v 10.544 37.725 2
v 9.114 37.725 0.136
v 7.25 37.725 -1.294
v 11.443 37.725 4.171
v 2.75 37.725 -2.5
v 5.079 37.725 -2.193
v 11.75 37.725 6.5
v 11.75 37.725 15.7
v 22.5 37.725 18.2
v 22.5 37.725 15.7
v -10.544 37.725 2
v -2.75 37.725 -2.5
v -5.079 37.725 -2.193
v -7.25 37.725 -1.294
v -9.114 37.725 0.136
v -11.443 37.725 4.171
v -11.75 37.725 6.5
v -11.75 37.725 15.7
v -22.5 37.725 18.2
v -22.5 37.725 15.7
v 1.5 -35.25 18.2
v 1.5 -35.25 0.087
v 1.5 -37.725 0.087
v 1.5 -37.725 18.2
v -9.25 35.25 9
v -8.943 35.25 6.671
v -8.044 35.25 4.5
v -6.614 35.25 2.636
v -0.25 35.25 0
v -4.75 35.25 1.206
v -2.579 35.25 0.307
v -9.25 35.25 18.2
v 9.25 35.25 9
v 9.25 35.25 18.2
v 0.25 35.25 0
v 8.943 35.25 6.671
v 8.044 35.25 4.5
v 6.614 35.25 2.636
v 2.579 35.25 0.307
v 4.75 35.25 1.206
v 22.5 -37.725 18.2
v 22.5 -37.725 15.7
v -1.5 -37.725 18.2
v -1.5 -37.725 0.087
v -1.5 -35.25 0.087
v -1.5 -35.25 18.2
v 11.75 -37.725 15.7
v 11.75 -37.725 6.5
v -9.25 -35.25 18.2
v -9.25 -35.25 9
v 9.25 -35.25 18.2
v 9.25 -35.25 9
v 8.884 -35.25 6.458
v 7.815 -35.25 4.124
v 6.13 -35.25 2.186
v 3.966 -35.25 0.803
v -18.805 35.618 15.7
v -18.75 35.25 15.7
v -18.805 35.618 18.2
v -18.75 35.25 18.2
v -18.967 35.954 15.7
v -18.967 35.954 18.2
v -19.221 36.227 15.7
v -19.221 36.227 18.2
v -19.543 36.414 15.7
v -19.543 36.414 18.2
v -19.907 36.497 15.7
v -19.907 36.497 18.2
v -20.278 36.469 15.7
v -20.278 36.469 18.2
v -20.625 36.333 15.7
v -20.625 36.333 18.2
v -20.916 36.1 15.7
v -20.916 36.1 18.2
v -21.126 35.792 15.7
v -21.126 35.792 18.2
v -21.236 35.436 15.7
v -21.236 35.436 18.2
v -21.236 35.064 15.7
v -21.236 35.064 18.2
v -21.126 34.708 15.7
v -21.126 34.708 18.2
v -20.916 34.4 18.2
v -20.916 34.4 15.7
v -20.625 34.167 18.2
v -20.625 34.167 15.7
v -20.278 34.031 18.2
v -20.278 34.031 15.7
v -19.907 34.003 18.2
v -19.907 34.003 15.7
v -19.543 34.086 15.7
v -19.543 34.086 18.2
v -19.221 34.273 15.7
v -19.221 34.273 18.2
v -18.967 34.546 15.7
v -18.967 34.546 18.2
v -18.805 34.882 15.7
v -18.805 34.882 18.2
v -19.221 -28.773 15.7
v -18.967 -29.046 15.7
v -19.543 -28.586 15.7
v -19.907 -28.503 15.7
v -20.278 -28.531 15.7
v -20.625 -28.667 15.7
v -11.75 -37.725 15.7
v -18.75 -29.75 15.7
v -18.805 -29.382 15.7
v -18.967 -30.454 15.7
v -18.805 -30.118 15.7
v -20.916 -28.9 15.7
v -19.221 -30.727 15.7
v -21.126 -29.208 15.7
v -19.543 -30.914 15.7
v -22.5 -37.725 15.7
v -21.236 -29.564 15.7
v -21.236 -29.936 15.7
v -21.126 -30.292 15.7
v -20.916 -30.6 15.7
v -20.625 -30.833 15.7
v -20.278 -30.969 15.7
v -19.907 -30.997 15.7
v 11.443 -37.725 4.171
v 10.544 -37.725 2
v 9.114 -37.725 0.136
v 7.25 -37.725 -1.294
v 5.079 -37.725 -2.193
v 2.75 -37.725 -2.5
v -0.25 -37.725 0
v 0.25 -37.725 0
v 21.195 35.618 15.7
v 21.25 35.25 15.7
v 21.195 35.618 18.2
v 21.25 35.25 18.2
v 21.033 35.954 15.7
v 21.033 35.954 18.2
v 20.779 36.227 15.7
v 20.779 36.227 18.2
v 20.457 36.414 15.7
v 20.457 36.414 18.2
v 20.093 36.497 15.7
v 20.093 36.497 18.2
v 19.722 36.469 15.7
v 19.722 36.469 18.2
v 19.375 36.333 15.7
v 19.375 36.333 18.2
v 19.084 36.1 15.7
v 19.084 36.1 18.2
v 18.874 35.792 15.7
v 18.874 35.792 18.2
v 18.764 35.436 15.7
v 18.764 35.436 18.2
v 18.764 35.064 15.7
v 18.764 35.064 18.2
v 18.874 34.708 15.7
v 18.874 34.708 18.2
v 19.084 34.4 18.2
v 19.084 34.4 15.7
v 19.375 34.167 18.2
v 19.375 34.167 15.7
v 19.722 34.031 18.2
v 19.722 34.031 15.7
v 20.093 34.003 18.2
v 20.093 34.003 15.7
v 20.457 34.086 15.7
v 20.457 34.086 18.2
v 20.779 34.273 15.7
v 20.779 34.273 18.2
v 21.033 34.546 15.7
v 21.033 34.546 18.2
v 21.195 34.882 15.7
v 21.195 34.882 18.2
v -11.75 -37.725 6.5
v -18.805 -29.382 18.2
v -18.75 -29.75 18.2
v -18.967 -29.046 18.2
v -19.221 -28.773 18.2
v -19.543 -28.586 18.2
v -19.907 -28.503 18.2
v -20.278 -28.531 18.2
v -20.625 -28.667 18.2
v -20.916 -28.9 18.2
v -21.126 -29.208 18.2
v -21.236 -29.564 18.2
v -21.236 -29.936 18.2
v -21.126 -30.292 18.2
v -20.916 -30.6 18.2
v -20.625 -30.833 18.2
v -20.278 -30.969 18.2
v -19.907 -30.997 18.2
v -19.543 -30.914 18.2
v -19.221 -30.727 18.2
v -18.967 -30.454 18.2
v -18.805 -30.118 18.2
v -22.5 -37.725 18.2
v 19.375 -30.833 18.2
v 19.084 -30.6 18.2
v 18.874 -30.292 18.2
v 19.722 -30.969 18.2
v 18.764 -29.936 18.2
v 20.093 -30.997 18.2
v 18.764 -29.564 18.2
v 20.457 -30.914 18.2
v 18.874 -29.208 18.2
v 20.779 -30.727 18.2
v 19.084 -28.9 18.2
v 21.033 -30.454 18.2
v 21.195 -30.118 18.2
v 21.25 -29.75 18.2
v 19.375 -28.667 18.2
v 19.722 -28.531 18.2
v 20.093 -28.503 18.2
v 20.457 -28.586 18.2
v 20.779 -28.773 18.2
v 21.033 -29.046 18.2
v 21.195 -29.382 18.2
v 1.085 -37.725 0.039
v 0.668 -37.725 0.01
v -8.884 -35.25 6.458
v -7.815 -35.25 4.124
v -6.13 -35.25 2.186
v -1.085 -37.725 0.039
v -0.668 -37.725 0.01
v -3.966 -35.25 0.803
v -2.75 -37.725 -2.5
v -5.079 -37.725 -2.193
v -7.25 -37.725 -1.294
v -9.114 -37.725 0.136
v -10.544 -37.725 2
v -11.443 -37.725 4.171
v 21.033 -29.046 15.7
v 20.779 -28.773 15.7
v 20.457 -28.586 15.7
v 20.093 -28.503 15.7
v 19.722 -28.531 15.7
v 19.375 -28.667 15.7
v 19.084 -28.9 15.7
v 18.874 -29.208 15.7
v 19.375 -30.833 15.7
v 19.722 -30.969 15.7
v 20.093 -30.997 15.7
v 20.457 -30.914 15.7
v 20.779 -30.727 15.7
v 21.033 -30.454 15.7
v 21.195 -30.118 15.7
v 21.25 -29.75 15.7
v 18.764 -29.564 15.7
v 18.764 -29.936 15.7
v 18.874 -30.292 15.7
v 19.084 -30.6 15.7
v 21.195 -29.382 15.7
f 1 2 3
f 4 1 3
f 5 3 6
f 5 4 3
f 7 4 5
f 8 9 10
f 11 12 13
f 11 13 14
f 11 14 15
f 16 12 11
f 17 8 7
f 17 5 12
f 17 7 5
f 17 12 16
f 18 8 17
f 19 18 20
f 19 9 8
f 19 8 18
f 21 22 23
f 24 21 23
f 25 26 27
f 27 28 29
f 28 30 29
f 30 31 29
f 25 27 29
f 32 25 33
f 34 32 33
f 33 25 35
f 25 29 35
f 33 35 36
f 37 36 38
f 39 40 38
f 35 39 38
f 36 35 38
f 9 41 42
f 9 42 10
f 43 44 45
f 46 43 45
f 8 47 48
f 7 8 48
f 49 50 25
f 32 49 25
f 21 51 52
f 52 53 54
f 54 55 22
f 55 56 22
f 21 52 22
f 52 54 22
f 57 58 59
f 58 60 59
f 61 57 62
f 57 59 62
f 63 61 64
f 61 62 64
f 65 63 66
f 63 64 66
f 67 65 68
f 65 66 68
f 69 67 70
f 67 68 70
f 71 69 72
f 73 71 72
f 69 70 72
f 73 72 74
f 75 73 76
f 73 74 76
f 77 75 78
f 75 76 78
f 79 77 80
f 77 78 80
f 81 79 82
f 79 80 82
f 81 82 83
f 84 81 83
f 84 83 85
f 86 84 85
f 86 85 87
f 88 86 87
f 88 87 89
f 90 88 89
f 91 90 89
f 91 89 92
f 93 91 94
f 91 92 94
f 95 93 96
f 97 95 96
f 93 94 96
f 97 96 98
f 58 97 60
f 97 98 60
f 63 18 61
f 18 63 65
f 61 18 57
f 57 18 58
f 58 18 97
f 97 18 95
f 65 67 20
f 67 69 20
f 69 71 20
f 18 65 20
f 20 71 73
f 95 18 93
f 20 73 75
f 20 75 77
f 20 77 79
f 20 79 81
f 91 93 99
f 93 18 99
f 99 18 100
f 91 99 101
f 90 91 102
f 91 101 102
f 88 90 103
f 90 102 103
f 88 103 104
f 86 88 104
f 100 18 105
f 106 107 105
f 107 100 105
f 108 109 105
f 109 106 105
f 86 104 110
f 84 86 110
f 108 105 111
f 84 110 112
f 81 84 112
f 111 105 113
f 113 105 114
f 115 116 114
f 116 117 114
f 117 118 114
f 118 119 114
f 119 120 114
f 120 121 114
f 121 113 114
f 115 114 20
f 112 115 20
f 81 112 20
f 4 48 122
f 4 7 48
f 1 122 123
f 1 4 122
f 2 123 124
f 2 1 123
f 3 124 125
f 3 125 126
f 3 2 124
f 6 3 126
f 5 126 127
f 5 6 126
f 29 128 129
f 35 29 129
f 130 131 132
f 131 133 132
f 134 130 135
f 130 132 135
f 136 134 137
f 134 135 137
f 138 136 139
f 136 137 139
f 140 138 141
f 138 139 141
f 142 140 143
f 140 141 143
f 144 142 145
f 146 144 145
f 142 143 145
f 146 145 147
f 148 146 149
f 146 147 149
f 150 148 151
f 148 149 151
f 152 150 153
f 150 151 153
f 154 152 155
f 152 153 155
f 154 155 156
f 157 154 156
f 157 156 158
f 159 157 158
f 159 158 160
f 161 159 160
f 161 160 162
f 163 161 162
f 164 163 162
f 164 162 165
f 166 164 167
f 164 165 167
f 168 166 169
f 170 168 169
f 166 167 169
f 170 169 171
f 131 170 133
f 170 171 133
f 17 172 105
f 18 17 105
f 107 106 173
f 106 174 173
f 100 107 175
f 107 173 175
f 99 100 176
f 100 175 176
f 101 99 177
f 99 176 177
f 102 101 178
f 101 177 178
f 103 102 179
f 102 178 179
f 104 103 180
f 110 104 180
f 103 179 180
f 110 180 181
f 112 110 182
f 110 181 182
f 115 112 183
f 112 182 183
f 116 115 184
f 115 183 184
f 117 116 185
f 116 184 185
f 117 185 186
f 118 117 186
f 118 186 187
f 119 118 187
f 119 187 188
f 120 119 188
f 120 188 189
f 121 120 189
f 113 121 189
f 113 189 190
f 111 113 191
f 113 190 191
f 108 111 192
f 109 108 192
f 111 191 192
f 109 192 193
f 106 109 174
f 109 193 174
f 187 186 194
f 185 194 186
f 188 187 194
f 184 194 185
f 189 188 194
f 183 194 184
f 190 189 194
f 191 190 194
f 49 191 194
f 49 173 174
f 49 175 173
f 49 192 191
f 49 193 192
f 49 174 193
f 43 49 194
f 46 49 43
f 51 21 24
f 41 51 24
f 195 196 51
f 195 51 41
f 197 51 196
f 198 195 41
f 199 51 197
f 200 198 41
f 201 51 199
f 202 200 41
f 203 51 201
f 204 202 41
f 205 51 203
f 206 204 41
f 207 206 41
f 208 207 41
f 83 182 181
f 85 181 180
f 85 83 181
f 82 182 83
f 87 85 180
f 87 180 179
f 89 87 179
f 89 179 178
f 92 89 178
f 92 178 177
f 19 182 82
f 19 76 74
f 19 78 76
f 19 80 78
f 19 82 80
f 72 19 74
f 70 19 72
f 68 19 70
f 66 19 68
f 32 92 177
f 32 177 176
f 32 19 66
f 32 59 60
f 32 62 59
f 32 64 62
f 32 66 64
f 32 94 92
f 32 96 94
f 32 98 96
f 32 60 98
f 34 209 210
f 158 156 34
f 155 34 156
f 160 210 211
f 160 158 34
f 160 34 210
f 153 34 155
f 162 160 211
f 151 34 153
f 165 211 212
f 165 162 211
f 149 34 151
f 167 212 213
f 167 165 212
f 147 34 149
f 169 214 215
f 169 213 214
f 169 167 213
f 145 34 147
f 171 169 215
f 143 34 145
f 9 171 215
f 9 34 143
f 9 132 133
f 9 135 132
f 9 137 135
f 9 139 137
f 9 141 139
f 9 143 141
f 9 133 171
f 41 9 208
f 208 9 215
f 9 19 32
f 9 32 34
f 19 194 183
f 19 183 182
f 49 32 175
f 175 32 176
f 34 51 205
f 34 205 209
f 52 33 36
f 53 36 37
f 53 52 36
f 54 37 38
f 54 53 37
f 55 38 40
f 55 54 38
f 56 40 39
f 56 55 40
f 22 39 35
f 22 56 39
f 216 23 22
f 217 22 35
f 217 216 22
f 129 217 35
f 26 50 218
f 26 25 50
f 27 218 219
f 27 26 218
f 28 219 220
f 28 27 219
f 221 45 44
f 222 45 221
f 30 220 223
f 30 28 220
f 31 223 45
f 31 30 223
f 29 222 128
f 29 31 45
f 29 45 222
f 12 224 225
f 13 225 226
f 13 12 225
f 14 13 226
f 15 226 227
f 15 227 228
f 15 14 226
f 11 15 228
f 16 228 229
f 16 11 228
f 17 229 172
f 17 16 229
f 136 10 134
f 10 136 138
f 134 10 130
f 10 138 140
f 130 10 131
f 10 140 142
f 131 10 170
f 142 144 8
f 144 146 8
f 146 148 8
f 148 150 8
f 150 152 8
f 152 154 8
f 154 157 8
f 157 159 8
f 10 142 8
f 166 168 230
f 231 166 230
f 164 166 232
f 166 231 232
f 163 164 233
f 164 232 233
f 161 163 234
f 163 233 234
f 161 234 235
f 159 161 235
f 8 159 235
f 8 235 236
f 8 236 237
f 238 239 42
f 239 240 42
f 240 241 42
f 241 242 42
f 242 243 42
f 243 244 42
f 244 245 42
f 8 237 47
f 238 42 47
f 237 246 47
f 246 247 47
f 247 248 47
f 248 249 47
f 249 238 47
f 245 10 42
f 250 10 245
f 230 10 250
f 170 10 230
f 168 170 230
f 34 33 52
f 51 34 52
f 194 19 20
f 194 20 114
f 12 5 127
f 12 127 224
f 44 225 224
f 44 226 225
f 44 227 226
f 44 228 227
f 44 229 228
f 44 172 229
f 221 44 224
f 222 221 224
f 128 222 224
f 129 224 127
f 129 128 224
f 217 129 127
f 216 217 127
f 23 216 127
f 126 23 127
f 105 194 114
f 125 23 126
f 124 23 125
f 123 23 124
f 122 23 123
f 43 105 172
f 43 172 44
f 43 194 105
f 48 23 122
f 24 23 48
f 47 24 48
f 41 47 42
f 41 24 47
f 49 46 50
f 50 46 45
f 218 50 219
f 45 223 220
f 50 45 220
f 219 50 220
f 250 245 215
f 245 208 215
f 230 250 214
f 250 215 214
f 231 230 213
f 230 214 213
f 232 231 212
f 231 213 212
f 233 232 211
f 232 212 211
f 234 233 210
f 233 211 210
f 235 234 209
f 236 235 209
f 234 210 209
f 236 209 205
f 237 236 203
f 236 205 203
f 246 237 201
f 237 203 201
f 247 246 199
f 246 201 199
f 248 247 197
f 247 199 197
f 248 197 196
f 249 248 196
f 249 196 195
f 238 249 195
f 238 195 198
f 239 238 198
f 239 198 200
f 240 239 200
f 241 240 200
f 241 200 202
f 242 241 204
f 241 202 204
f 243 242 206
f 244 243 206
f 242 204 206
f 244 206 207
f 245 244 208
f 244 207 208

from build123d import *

# Parameters (mm, degrees)
BOSS_EXTRUDE1_DEPTH               = 18.2
SKETCH1_3_W                       = 45
SKETCH1_3_H                       = 75.45
BOSS_EXTRUDE2_DEPTH               = 5.5
FILLET1_R                         = 9
CUT_EXTRUDE1_DEPTH                = 103
TAP_DRILL_FOR_M3_TAP1_D           = 2.5
TAP_DRILL_FOR_M3_TAP1_CSINK_D     = 2.55
TAP_DRILL_FOR_M3_TAP1_CSINK_ANGLE = 90
FILLET2_R                         = 9


with BuildPart() as part:
    # Sketch1 → Boss-Extrude1 (new body)
    with BuildSketch(Plane.XY):
        Polygon((1.5, -37.725), (22.5, -37.725), (22.5, 37.725), (-22.5, 37.725), (-22.5, -37.725), (-1.5, -37.725), (-1.5, -35.25), (-9.25, -35.25), (-9.25, 35.25), (9.25, 35.25), (9.25, -35.25), (1.5, -35.25), align=None)
    extrude(amount=BOSS_EXTRUDE1_DEPTH)

    # Sketch1<3> → Boss-Extrude2 (add)
    with BuildSketch(Plane.XY):
        Rectangle(SKETCH1_3_W, SKETCH1_3_H)
    extrude(amount=-BOSS_EXTRUDE2_DEPTH)

    # Fillet1
    fillet1_edges = [part.edges().sort_by_distance(p)[0] for p in [
        (-9.25, 0, 0),
        (9.25, 0, 0),
    ]]
    fillet(fillet1_edges, radius=FILLET1_R)

    # Sketch4 → Cut-Extrude1 (cut)
    with BuildSketch(Plane.XZ.offset(37.725)):
        Polygon((-11.75, 15.7), (-22.5, 15.7), (-22.5, -5.5), (22.5, -5.5), (22.5, 15.7), (11.75, 15.7), (11.75, -2.5), (-11.75, -2.5), align=None)
    extrude(amount=-CUT_EXTRUDE1_DEPTH, mode=Mode.SUBTRACT)

    # Tap Drill for M3 Tap1 (through all)
    with Locations(Plane(origin=(0, 0, -5.5), x_dir=(-1, 0, 0), z_dir=(0, 0, -1))):
        with Locations((19.999953282, 35.25), (-20.000046718, 35.25), (-20.000046718, -29.75), (19.999953282, -29.75)):
            CounterSinkHole(TAP_DRILL_FOR_M3_TAP1_D / 2, TAP_DRILL_FOR_M3_TAP1_CSINK_D / 2, counter_sink_angle=TAP_DRILL_FOR_M3_TAP1_CSINK_ANGLE)

    # Fillet2
    fillet2_edges = [part.edges().sort_by_distance(p)[0] for p in [
        (-11.75, 0, -2.5),
        (11.75, 0, -2.5),
    ]]
    fillet(fillet2_edges, radius=FILLET2_R)


solid = part.part
